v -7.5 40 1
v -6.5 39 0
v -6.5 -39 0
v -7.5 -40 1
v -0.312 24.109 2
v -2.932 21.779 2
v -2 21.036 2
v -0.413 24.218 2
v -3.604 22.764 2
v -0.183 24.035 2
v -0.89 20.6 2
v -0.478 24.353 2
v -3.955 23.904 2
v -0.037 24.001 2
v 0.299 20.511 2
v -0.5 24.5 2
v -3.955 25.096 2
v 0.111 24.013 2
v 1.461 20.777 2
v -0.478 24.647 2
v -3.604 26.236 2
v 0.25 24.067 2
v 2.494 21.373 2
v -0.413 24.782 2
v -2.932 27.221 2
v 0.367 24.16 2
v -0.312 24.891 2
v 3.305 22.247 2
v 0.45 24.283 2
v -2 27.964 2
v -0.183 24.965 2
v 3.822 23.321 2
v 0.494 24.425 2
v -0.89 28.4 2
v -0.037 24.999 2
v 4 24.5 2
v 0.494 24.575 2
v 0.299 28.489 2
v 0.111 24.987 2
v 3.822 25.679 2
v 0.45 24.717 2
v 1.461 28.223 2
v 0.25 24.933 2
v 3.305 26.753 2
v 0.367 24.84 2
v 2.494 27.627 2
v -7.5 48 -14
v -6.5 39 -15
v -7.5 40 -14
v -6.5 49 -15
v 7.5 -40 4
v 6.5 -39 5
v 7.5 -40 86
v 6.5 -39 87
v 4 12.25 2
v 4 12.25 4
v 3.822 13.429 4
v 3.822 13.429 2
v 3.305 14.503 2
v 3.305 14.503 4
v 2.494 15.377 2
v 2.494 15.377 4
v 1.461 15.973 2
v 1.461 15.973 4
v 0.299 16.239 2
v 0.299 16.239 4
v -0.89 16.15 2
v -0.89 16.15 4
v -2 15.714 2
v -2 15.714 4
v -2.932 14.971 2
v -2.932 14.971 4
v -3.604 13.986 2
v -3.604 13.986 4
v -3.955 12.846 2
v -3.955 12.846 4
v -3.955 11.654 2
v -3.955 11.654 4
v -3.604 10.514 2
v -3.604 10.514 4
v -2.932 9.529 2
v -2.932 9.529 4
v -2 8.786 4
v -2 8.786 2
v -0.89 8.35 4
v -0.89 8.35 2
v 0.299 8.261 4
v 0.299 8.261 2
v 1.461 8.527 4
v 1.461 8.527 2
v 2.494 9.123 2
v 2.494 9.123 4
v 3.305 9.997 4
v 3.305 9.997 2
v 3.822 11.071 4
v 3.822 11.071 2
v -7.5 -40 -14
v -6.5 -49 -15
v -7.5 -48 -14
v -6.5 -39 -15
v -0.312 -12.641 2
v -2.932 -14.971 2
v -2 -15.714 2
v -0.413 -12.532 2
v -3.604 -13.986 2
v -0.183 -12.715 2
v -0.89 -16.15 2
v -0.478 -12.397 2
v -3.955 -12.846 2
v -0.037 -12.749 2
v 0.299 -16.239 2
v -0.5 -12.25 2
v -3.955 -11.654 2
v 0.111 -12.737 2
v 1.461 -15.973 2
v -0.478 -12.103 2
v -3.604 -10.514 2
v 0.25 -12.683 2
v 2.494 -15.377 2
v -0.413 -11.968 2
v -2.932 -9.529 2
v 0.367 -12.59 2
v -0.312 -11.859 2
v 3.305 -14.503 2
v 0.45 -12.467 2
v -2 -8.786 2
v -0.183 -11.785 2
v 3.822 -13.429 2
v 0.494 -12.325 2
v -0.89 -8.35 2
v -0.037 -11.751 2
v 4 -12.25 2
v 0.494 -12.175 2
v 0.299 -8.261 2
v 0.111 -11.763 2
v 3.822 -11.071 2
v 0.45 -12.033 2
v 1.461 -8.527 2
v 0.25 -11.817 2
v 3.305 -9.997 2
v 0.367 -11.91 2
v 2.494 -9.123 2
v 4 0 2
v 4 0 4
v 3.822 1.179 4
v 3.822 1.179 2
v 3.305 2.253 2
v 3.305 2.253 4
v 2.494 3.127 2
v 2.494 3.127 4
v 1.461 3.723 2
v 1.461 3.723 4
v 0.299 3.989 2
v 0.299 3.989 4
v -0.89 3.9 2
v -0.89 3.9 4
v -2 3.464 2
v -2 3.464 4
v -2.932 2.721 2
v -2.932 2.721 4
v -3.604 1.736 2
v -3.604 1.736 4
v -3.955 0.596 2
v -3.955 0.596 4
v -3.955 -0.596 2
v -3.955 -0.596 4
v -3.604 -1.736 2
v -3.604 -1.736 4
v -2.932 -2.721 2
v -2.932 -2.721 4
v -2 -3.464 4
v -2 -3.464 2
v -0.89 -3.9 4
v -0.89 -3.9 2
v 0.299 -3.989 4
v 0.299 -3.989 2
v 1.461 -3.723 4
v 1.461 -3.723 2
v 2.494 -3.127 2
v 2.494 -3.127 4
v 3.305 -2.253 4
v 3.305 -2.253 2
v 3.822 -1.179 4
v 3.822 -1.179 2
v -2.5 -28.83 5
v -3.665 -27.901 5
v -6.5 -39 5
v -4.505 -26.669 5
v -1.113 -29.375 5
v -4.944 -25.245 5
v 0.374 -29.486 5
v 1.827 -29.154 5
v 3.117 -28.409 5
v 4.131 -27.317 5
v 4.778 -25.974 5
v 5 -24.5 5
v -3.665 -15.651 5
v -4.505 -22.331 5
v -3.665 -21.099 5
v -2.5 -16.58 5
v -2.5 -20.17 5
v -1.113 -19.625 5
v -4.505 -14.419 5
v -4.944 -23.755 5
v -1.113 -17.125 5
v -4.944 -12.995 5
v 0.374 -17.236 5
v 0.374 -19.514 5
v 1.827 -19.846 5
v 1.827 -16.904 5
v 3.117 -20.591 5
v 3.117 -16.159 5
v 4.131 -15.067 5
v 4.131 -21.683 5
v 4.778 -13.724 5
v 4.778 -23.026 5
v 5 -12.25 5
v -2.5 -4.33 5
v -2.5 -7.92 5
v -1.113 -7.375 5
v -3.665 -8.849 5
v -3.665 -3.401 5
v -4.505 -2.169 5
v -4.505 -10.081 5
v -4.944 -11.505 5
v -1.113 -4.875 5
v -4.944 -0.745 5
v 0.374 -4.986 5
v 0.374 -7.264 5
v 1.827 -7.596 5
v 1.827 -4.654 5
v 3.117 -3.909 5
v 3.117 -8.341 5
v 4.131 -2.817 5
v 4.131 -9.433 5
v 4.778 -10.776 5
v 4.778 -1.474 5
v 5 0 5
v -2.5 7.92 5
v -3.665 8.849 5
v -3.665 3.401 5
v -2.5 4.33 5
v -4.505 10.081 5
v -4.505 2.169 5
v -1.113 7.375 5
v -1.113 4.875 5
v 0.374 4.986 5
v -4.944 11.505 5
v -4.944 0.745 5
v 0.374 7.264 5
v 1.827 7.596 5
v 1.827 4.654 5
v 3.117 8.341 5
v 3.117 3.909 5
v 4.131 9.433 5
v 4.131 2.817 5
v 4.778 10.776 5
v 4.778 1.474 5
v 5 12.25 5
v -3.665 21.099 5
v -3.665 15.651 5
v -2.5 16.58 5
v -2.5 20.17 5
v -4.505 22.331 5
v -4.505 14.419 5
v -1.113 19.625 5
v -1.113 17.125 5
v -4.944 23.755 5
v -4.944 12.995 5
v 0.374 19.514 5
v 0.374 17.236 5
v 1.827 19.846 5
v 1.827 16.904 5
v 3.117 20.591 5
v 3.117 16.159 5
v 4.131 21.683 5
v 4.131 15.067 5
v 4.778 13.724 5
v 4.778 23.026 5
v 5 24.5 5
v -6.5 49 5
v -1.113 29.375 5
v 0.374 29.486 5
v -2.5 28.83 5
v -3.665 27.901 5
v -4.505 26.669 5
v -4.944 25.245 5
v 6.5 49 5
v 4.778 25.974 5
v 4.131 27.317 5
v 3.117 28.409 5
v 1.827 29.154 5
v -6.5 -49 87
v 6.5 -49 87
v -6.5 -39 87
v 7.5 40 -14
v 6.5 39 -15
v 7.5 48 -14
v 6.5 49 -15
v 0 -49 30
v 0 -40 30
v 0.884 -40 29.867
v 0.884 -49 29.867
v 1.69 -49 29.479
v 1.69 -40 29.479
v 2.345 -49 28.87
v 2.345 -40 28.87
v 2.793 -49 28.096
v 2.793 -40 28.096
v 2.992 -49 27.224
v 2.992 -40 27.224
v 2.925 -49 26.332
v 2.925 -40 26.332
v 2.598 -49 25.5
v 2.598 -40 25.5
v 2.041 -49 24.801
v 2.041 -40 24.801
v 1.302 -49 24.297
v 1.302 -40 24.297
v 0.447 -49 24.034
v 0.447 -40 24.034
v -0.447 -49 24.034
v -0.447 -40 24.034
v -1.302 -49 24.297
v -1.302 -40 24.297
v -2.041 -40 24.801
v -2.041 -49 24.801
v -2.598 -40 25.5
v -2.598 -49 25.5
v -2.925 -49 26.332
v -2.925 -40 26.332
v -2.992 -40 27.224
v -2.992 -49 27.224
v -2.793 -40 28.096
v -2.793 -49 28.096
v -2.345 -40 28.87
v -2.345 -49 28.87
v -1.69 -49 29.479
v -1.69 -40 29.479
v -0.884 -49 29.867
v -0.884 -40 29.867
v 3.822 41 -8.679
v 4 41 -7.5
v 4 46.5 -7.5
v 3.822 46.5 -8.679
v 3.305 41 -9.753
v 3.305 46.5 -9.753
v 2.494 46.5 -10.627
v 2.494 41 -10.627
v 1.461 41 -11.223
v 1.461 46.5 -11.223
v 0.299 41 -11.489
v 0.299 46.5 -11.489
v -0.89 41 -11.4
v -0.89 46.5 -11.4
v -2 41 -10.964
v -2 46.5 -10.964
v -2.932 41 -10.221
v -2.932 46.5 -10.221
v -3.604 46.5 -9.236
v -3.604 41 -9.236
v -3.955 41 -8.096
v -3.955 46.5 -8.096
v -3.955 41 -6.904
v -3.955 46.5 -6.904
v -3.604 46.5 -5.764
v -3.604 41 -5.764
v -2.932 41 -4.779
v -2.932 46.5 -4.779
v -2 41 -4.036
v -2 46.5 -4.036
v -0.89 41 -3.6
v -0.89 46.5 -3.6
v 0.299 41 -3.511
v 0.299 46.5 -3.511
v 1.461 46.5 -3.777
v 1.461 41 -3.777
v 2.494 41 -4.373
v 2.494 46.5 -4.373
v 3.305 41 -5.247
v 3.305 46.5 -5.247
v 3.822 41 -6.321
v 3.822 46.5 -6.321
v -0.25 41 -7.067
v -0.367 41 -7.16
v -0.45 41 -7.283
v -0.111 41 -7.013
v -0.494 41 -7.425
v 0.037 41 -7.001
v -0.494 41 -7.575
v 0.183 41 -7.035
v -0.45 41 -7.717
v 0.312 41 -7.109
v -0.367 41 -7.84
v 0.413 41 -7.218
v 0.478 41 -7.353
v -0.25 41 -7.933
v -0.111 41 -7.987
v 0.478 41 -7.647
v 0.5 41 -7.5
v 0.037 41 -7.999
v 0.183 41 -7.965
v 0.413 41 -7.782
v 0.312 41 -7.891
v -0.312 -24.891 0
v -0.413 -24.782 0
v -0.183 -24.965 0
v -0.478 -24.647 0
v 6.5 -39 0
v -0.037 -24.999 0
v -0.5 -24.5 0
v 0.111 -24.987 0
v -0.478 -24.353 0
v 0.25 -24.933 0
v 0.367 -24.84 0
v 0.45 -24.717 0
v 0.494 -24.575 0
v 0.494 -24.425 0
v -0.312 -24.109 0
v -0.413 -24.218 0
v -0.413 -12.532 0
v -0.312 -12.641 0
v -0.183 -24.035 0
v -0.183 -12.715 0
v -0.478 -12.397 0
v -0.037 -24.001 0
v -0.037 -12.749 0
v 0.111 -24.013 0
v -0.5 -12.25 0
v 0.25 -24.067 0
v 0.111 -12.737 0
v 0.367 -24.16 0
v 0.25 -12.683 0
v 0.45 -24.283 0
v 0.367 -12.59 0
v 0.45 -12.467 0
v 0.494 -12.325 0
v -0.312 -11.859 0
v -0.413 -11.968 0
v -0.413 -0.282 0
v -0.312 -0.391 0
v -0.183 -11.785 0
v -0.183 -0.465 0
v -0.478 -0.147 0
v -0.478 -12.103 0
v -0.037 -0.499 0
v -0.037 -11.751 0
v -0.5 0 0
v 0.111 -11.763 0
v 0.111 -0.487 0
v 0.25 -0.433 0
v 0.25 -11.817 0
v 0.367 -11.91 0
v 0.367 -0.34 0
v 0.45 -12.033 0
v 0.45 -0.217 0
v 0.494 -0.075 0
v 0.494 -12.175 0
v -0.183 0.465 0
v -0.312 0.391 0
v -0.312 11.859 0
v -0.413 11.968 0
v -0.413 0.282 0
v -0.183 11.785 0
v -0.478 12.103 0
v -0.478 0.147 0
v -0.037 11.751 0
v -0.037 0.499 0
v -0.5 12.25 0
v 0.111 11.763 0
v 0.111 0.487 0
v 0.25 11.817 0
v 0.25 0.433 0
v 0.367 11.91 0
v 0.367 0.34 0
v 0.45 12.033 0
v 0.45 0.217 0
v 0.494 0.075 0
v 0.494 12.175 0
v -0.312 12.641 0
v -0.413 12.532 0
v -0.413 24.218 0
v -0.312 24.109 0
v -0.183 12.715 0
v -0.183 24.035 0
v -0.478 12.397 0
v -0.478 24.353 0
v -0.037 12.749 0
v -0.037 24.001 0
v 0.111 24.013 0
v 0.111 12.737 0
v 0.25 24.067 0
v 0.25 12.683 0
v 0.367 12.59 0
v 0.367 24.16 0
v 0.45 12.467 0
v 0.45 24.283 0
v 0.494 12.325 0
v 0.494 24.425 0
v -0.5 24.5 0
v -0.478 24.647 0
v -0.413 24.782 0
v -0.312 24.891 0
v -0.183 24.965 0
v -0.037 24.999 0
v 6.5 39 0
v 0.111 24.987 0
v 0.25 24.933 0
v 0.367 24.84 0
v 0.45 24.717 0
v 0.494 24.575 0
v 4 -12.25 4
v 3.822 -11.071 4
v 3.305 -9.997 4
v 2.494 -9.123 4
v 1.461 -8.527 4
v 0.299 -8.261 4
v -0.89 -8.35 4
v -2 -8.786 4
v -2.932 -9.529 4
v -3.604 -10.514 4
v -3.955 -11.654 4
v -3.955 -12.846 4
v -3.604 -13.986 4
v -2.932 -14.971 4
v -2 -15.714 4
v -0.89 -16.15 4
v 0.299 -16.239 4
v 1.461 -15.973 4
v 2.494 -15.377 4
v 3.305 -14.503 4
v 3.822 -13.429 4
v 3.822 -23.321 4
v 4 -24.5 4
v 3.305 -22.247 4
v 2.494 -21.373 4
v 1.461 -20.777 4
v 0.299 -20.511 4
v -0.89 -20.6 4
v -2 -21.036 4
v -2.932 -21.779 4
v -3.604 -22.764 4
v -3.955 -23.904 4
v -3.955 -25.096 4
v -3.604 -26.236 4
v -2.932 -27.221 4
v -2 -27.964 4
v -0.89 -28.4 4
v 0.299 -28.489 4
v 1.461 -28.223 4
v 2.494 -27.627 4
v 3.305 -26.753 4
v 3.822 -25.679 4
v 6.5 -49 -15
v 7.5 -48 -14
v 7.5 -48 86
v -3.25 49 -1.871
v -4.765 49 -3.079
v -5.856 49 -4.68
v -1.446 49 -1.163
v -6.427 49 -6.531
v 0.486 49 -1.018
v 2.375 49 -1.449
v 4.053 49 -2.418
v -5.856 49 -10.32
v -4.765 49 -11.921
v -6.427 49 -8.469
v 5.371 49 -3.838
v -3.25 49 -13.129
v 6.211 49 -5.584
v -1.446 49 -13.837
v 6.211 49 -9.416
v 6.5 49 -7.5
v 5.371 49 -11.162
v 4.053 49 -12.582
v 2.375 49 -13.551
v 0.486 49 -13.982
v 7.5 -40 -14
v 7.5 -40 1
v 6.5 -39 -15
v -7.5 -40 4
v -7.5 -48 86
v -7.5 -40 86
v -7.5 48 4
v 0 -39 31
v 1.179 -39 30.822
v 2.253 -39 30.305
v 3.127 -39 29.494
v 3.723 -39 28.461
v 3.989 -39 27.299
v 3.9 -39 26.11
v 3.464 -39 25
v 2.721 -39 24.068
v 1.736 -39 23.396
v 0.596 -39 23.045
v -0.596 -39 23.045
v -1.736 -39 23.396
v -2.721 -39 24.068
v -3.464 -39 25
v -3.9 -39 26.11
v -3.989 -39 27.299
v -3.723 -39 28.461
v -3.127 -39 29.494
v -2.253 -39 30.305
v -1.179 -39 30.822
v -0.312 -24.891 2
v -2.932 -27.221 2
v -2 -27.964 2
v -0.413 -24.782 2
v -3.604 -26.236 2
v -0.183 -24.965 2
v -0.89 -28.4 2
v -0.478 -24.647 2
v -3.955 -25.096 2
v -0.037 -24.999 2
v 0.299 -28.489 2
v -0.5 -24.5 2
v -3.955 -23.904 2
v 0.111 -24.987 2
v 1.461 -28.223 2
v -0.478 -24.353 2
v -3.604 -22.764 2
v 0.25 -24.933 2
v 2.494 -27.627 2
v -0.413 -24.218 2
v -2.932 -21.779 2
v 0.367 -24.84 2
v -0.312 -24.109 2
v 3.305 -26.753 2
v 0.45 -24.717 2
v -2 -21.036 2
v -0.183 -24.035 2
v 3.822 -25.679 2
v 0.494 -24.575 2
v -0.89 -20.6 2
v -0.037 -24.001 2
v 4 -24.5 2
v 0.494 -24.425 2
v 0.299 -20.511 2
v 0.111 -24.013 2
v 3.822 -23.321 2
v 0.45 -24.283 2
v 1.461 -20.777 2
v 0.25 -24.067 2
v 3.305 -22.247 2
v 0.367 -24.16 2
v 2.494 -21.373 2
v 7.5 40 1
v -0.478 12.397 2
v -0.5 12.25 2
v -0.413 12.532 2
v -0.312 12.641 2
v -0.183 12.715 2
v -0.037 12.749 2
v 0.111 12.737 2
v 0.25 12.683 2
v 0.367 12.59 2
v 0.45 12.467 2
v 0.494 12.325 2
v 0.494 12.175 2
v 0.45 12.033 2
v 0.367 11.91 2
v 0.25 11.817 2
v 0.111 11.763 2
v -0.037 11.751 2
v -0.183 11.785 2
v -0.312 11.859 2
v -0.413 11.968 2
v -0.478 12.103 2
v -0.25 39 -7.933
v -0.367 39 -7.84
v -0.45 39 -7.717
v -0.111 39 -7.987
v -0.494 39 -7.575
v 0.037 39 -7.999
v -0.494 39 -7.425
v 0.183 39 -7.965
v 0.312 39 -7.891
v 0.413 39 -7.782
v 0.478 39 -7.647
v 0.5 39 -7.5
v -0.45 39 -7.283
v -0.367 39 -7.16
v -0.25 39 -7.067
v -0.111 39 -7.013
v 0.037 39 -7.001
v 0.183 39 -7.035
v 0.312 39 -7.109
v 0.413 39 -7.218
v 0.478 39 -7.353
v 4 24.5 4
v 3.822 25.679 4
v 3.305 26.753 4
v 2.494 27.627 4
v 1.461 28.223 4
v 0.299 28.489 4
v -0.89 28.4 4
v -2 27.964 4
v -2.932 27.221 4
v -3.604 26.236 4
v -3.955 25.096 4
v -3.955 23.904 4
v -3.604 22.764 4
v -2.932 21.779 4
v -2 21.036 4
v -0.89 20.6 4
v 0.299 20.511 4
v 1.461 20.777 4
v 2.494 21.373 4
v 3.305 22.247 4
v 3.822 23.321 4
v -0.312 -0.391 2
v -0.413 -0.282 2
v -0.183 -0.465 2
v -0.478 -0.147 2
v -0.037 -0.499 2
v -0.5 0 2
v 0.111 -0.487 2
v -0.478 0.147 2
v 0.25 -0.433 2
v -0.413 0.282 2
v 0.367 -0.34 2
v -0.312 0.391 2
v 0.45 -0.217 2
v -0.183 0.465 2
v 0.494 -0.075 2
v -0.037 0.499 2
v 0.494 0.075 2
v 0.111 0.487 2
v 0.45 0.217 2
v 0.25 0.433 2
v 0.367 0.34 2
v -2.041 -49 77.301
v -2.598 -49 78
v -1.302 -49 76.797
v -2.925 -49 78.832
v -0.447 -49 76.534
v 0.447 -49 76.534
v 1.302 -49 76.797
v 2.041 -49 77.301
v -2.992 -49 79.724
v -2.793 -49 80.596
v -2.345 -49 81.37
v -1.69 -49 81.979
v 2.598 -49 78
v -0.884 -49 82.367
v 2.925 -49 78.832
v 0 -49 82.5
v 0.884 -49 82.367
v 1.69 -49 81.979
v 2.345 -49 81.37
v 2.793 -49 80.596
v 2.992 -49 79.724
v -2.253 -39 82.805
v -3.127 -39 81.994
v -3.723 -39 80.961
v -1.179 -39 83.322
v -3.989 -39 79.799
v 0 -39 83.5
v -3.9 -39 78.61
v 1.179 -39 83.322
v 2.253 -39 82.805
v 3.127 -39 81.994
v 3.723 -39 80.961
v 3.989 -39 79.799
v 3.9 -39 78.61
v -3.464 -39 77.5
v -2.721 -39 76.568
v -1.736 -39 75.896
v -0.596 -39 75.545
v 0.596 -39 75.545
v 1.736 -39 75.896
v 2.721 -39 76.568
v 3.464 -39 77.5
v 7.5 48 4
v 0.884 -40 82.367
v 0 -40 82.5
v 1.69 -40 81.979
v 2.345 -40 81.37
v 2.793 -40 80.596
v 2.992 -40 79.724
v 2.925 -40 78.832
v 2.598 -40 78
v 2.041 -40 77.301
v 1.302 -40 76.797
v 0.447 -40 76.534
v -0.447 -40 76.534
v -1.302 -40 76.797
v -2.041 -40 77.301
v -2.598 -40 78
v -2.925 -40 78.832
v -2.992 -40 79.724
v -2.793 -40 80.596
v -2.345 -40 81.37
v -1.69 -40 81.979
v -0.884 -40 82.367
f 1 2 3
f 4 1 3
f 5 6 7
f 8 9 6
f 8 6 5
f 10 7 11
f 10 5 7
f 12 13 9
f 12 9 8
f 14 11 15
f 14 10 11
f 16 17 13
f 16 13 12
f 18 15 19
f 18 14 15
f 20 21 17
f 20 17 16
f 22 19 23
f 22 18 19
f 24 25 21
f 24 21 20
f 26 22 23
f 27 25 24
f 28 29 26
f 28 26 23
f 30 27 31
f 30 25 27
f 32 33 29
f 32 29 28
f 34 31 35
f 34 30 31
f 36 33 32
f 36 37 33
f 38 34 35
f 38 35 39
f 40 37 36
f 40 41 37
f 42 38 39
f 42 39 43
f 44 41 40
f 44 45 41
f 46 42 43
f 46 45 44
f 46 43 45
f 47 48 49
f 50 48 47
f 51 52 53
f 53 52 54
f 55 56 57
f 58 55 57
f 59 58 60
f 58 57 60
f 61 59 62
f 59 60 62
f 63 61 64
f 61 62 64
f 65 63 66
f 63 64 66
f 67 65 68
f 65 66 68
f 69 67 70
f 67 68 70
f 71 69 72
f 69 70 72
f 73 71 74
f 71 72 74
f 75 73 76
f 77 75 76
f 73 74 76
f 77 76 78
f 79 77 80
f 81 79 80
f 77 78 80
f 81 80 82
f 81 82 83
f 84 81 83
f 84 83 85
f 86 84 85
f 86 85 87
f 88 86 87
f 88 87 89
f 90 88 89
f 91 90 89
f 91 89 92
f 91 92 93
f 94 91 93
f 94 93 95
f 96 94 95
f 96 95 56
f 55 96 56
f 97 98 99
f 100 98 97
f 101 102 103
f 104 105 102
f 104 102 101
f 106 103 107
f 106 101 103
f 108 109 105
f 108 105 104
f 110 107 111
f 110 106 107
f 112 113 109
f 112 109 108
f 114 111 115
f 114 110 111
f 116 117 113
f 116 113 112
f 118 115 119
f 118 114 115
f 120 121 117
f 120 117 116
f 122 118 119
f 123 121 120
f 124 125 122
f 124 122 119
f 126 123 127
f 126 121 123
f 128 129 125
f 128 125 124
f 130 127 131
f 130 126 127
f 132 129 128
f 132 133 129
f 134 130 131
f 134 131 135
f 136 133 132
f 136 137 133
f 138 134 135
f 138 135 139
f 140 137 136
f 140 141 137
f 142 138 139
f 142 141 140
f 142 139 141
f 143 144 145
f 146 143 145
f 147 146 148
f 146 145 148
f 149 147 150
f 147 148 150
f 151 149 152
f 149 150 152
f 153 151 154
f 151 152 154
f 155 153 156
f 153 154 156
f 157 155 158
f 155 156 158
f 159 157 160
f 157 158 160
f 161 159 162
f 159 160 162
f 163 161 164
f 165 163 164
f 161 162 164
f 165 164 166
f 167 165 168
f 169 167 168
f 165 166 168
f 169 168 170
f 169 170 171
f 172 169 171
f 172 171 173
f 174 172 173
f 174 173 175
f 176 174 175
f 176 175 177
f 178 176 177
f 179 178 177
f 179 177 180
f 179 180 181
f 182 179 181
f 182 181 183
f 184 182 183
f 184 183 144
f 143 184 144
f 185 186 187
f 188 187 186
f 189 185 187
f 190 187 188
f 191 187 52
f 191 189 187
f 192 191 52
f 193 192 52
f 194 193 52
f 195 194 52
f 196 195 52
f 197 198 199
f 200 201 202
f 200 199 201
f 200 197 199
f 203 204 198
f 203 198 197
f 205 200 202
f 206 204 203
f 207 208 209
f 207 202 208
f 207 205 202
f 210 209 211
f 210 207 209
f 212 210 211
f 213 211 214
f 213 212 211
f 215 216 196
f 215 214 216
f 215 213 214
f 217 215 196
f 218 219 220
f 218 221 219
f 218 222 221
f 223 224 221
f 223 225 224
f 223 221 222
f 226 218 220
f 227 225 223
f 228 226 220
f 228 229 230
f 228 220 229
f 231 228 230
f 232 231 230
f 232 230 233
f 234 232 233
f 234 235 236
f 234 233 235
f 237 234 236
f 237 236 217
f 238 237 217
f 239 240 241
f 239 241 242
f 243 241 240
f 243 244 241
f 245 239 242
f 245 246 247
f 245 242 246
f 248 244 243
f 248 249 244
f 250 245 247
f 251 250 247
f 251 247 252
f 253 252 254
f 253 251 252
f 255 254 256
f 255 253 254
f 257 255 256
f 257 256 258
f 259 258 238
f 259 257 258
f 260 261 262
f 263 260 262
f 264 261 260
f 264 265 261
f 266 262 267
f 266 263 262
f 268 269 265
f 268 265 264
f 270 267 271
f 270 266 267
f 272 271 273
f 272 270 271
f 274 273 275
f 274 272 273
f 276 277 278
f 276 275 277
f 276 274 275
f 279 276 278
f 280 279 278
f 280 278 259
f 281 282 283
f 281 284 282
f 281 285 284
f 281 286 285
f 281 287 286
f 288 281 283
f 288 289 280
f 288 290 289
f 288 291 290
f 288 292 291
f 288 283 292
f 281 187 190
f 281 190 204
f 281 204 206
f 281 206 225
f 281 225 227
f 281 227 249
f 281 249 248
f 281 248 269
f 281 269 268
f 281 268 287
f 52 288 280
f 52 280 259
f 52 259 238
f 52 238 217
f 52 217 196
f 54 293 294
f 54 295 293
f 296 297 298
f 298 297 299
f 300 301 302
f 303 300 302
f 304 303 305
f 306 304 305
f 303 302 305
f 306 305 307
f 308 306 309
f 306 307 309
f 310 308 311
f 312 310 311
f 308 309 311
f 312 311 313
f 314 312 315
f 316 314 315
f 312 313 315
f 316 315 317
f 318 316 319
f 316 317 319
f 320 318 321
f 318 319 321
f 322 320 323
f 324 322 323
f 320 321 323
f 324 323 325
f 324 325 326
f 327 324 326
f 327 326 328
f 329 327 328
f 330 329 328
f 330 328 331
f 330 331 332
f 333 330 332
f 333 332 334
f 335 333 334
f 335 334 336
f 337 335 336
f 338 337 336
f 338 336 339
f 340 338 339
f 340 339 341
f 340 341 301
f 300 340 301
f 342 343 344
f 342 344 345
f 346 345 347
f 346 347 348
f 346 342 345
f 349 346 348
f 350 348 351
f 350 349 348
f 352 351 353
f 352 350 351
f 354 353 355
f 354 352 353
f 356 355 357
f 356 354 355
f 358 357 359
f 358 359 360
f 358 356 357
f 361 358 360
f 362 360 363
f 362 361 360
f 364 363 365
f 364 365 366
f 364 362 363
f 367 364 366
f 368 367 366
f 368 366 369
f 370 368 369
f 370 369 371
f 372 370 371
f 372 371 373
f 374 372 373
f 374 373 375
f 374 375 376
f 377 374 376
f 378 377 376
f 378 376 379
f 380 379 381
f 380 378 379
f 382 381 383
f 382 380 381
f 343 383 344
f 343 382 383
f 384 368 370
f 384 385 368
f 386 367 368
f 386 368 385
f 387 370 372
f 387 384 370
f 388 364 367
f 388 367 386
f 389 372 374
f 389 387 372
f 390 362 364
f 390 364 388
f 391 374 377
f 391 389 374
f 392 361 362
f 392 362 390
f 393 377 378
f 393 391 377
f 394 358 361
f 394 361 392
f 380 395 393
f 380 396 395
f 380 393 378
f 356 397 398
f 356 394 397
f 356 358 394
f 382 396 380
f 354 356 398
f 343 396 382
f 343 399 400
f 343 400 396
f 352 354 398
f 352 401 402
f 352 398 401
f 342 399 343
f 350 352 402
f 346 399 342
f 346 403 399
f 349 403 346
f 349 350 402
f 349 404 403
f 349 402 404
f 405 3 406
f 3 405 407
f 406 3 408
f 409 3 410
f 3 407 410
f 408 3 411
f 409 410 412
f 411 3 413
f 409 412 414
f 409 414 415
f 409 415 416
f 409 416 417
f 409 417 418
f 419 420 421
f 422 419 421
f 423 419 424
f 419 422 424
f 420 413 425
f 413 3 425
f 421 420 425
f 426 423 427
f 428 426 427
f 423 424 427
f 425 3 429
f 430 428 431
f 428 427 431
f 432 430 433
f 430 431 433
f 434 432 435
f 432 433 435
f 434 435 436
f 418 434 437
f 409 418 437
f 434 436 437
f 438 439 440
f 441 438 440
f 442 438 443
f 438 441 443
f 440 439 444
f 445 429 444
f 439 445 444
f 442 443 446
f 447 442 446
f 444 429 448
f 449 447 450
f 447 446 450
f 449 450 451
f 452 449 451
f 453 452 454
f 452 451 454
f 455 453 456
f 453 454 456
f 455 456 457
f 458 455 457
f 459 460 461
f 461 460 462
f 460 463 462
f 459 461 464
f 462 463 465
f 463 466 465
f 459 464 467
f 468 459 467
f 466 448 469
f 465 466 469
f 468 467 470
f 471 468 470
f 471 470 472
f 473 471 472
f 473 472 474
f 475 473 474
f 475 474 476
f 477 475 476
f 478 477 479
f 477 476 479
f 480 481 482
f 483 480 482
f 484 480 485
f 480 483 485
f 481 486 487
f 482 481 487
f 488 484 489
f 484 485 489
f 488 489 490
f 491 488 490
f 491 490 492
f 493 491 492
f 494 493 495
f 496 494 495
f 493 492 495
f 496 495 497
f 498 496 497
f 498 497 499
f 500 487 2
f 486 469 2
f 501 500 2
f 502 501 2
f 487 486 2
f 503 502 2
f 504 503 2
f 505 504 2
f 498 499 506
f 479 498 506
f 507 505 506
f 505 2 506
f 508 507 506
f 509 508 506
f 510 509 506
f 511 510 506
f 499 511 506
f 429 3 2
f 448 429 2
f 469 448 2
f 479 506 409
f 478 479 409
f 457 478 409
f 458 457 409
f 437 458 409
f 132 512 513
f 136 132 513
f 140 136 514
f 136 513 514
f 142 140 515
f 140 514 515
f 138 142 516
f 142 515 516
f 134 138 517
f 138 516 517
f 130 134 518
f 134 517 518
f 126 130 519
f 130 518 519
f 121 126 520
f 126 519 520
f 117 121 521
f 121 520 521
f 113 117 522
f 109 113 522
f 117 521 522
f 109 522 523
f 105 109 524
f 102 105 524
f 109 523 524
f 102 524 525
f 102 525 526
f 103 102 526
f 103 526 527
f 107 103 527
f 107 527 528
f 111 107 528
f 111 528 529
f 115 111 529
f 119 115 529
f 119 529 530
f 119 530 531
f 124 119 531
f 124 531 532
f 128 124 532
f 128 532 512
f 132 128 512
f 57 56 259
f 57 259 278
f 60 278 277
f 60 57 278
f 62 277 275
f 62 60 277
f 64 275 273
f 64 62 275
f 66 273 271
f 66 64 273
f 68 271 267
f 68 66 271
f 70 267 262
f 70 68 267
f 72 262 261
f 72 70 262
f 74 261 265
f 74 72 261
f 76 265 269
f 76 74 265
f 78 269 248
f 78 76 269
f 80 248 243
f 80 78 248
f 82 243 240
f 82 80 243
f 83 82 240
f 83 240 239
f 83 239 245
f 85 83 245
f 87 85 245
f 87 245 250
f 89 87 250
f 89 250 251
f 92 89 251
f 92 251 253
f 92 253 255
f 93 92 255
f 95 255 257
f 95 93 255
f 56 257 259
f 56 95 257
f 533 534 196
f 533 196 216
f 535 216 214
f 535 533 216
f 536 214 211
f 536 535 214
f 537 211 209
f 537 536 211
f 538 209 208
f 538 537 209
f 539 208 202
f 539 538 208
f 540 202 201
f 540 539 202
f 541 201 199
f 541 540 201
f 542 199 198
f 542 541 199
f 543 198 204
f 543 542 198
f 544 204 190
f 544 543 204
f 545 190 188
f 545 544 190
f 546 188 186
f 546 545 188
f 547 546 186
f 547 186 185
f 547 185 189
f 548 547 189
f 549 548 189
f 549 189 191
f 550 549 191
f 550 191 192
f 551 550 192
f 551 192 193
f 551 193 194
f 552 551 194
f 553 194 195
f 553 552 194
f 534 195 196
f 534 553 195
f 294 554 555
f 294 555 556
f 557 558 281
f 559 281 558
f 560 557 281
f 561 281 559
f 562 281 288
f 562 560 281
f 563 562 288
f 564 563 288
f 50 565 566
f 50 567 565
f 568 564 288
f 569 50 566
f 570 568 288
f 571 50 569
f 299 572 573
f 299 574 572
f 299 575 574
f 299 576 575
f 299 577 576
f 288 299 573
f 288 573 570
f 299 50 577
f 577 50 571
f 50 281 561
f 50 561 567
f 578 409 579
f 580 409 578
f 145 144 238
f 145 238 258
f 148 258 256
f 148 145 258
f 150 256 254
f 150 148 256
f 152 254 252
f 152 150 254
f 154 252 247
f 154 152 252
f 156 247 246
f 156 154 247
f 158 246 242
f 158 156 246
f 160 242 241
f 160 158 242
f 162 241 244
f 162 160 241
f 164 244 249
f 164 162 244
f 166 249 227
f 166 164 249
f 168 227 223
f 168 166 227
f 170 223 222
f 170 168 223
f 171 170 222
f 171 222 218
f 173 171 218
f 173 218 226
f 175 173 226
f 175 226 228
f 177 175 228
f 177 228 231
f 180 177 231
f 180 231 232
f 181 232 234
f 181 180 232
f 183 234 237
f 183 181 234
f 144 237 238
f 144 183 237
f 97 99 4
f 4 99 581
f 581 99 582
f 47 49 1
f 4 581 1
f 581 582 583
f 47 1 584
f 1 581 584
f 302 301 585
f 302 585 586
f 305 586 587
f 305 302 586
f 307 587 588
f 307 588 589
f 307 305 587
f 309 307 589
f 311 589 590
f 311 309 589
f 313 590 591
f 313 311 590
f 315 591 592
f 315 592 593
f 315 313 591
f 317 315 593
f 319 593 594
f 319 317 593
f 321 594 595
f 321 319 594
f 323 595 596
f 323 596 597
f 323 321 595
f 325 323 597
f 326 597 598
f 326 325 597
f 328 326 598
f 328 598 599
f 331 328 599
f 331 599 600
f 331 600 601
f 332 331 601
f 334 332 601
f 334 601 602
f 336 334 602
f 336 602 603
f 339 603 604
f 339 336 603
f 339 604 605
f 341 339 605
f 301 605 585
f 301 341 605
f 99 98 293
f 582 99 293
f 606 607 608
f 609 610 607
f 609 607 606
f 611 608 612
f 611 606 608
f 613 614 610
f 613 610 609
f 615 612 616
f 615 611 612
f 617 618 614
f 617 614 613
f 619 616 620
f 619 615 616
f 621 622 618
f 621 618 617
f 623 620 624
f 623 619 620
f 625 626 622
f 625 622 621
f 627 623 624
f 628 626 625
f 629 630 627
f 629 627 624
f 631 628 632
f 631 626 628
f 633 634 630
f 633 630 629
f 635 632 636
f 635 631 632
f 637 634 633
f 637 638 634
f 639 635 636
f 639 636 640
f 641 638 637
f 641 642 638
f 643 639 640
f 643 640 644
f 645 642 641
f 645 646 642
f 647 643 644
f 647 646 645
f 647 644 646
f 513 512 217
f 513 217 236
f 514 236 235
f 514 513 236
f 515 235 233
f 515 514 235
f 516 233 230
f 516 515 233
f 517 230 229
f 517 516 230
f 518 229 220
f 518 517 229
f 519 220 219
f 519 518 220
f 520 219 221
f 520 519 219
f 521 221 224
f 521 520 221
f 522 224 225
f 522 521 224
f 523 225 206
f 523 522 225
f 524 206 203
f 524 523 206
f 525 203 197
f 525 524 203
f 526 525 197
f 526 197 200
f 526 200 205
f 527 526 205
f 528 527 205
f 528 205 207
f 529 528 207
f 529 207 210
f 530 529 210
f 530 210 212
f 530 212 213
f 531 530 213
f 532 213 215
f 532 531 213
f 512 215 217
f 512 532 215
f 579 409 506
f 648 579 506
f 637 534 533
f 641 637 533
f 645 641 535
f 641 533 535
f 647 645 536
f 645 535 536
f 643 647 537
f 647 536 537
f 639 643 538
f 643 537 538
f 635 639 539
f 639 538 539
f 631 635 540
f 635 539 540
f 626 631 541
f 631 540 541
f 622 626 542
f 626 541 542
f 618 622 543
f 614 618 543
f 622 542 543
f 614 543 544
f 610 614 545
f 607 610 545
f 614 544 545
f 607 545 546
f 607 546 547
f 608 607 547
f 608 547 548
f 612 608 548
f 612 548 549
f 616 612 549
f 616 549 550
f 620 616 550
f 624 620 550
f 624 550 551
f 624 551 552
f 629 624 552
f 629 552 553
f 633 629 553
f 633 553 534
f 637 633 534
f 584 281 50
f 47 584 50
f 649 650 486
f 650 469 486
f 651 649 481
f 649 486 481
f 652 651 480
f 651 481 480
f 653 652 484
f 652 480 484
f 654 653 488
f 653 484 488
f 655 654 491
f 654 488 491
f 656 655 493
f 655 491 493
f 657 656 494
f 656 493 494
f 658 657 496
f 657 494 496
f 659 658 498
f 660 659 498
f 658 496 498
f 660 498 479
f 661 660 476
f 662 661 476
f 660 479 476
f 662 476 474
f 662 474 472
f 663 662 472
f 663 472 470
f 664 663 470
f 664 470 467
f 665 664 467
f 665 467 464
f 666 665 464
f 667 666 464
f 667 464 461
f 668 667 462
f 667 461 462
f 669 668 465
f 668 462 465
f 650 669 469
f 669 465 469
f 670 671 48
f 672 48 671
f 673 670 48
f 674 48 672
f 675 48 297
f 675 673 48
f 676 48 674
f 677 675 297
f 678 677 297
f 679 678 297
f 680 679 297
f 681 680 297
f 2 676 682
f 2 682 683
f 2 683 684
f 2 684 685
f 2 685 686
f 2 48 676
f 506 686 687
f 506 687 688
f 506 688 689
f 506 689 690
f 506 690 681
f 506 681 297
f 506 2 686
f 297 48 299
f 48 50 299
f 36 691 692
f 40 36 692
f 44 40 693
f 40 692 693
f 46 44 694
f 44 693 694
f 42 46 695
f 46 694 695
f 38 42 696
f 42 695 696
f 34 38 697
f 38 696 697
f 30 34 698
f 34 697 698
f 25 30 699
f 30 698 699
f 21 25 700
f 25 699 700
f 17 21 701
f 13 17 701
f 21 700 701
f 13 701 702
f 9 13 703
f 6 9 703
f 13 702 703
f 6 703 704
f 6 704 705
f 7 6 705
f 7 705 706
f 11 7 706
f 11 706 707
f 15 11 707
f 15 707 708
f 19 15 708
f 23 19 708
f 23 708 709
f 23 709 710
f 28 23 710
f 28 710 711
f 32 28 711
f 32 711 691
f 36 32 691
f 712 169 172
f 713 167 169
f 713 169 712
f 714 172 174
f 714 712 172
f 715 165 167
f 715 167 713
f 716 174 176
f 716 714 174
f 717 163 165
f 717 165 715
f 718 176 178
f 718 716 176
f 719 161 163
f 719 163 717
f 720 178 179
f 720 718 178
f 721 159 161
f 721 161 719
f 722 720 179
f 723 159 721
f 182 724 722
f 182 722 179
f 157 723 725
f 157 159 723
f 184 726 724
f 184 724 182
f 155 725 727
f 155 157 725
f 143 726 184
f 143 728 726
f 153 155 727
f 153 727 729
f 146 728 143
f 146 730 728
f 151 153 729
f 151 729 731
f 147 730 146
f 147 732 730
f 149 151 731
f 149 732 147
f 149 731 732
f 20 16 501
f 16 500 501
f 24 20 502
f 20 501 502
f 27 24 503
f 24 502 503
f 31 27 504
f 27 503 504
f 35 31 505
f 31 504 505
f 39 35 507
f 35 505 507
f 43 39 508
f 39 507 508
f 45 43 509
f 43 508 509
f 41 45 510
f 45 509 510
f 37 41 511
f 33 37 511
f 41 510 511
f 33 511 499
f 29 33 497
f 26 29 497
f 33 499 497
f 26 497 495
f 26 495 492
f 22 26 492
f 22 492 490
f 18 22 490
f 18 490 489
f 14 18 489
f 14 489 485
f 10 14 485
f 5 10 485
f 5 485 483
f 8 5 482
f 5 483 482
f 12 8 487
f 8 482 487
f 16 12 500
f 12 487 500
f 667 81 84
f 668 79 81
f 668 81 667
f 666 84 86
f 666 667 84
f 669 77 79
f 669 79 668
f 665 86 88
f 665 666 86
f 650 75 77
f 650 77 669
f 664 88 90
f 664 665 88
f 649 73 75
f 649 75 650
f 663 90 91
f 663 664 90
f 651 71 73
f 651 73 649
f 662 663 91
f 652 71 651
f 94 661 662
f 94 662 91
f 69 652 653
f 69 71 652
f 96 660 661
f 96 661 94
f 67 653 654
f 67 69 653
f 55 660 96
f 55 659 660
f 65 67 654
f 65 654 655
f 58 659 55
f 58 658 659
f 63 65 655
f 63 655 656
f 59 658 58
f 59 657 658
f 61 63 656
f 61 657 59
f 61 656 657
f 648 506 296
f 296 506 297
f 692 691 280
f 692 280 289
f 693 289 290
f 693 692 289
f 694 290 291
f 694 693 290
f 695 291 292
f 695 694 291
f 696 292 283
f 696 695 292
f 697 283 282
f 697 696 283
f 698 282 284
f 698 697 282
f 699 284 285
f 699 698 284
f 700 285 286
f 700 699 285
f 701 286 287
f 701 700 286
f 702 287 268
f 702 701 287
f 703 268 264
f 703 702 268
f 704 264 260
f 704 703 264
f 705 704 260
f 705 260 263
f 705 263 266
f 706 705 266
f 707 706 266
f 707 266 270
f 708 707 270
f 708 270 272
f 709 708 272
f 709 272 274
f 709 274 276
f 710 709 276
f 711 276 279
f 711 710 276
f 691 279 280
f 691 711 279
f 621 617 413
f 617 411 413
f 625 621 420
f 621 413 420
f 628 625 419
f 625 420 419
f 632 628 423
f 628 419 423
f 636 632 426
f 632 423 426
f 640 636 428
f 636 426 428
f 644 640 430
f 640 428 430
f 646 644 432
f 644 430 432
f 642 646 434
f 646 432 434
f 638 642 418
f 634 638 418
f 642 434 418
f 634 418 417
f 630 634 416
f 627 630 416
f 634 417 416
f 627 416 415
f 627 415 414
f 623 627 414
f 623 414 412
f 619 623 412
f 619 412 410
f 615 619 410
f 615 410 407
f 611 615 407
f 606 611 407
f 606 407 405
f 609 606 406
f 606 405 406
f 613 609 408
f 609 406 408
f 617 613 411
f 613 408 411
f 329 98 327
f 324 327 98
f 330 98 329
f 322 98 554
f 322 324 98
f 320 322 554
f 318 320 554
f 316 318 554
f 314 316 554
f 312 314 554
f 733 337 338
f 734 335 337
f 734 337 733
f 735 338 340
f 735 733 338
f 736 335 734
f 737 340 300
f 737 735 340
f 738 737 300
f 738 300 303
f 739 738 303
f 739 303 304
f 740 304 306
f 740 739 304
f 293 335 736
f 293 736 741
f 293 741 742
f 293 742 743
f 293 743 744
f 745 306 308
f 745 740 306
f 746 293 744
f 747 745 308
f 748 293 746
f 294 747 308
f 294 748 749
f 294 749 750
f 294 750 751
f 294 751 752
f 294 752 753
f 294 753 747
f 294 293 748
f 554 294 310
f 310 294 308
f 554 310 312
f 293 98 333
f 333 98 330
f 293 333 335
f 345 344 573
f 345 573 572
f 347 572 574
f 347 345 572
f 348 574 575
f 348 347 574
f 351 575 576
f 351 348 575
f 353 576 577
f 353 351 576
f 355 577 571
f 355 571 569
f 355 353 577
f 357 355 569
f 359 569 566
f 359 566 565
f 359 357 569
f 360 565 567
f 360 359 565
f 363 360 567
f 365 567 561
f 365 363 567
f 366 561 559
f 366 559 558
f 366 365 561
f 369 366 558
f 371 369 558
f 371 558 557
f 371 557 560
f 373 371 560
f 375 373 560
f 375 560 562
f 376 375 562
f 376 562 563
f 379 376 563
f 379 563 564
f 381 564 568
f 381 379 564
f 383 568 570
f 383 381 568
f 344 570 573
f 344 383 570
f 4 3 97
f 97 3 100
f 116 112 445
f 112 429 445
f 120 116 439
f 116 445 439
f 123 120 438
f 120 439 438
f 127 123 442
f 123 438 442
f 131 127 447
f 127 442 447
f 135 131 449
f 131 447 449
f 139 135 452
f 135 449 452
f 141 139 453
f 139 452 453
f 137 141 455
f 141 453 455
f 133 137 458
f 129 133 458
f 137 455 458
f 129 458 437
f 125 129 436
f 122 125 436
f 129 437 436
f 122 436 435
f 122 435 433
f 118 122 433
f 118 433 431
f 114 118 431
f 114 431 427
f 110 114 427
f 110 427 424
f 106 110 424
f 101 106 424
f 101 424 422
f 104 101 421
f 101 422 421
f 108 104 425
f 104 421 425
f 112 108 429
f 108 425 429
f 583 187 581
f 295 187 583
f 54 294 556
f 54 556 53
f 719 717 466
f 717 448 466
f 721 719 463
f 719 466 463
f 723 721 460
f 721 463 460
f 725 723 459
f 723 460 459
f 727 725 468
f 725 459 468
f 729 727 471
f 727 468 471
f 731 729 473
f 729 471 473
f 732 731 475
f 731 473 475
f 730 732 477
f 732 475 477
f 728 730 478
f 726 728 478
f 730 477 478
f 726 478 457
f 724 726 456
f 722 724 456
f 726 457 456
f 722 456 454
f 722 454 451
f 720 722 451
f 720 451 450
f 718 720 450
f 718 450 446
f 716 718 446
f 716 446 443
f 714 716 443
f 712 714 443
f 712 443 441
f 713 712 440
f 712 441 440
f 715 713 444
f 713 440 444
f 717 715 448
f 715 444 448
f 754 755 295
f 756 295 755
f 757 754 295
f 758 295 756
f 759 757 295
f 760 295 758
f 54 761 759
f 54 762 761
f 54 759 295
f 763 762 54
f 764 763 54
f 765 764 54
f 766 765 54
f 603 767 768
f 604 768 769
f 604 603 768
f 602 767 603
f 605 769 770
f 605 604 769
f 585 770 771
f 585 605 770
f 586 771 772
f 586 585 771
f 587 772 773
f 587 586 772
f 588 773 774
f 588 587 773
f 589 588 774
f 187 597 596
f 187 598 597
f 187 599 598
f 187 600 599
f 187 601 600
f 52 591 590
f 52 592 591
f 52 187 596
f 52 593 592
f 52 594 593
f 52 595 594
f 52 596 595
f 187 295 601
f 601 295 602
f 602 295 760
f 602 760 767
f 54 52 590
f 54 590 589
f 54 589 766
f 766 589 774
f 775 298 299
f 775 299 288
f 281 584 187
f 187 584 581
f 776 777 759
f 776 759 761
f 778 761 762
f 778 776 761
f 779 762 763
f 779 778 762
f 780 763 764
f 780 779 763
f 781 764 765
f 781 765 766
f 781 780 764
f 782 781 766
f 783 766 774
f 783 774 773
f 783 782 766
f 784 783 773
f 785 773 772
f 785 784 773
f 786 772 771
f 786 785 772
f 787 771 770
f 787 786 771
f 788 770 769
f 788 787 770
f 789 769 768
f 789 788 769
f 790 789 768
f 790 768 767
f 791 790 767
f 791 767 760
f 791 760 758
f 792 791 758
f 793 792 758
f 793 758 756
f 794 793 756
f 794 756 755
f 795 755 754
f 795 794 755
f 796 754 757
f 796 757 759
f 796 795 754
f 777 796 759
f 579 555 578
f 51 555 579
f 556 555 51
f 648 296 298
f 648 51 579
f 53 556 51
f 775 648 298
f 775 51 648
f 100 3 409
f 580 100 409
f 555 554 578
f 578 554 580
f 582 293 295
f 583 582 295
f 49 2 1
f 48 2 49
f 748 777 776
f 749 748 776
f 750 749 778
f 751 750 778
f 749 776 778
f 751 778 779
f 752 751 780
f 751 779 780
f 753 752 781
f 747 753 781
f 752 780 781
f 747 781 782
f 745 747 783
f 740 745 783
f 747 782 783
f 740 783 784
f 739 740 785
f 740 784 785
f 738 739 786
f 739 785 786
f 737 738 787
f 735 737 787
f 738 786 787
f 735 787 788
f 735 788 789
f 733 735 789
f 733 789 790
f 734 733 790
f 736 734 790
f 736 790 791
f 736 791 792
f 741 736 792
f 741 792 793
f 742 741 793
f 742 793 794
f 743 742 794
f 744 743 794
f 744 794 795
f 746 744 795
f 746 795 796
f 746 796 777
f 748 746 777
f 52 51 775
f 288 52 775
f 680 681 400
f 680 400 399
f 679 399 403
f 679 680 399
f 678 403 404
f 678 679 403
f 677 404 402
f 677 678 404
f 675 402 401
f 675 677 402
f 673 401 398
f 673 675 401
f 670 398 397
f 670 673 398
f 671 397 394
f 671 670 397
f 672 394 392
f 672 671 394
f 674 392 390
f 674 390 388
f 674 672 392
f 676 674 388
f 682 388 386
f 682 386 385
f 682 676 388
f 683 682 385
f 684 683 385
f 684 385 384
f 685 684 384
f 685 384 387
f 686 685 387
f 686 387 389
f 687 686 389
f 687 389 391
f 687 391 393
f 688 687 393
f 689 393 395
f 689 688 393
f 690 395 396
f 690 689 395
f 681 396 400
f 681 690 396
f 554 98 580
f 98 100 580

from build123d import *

# Parameters (mm, degrees)
SKETCH1_W           = 15
SKETCH1_H           = 10
SKETCH1_H_2         = 78
BOSS_EXTRUDE1_DEPTH = 5
SKETCH1_3_W         = 15
SKETCH1_3_H         = 10
BOSS_EXTRUDE2_DEPTH = 15
HOLE1_D             = 1
HOLE1_CBORE_D       = 8
HOLE1_CBORE_DEPTH   = 3
SKETCH1_4_W         = 15
SKETCH1_4_H         = 10
BOSS_EXTRUDE3_DEPTH = 87
HOLE2_START         = 41
HOLE2_OUTLINE_R     = 4
HOLE2_DEPTH         = 8
HOLE2_START_2       = 39
HOLE2_2_OUTLINE_R   = 0.5
HOLE2_2_DEPTH       = 2
CUT_EXTRUDE1_REACH  = 125.973
SKETCH9_R           = 3
CHAMFER1_SIZE       = 2.5
CHAMFER2_SIZE       = 1
CHAMFER3_SIZE       = 1


# Read off the part's stored shape, not the designer's step: Hole2
with BuildPart() as part:
    # Sketch1 → Boss-Extrude1 (new body)
    with BuildSketch(Plane.XY):
        with Locations((0, -44)):
            Rectangle(SKETCH1_W, SKETCH1_H)
        Rectangle(SKETCH1_W, SKETCH1_H_2)
        with Locations((0, 44)):
            Rectangle(SKETCH1_W, SKETCH1_H)
    extrude(amount=BOSS_EXTRUDE1_DEPTH)

    # Sketch1<3> → Boss-Extrude2 (add)
    with BuildSketch(Plane.XY):
        with Locations((0, -44)):
            Rectangle(SKETCH1_3_W, SKETCH1_3_H)
        with Locations((0, 44)):
            Rectangle(SKETCH1_3_W, SKETCH1_3_H)
    extrude(amount=-BOSS_EXTRUDE2_DEPTH)

    # Hole1 (through all)
    with Locations(Plane.XY.offset(5)):
        with Locations((0, 24.5), (0, 12.25), (0, 0), (0, -12.25), (0, -24.5)):
            CounterBoreHole(HOLE1_D / 2, HOLE1_CBORE_D / 2, HOLE1_CBORE_DEPTH)

    # Sketch1<4> → Boss-Extrude3 (add)
    with BuildSketch(Plane.XY):
        with Locations((0, -44)):
            Rectangle(SKETCH1_4_W, SKETCH1_4_H)
    extrude(amount=BOSS_EXTRUDE3_DEPTH)

    # Hole2 outline → Hole2 (cut)
    with BuildSketch(Plane(origin=(0, 0, 0), x_dir=(1, 0, 0), z_dir=(0, 1, 0)).offset(HOLE2_START)):
        with Locations((0, 7.5)):
            Circle(HOLE2_OUTLINE_R)
    extrude(amount=HOLE2_DEPTH, mode=Mode.SUBTRACT)

    # Hole2 2 outline → Hole2 2 (cut)
    with BuildSketch(Plane(origin=(0, 0, 0), x_dir=(1, 0, 0), z_dir=(0, 1, 0)).offset(HOLE2_START_2)):
        with Locations((0, 7.5)):
            Circle(HOLE2_2_OUTLINE_R)
    extrude(amount=HOLE2_2_DEPTH, mode=Mode.SUBTRACT)

    # Sketch9 → Cut-Extrude1 (cut, up to next)
    with BuildSketch(Plane(origin=(0, -39, 0), x_dir=(1, 0, 0), z_dir=(0, 1, 0)), mode=Mode.PRIVATE) as cut_extrude1_sk1:
        with Locations(Location((0, -27, 0), (0, 0, 270))):
            Circle(SKETCH9_R)
    cut_extrude1_tool1 = extrude(cut_extrude1_sk1.sketch, amount=-CUT_EXTRUDE1_REACH, mode=Mode.PRIVATE) & part.part
    # Sketch9 → Cut-Extrude1 (cut, up to next)
    with BuildSketch(Plane(origin=(0, -39, 0), x_dir=(1, 0, 0), z_dir=(0, 1, 0)), mode=Mode.PRIVATE) as cut_extrude1_sk2:
        with Locations(Location((0, -79.5, 0), (0, 0, 270))):
            Circle(SKETCH9_R)
    cut_extrude1_tool2 = extrude(cut_extrude1_sk2.sketch, amount=-CUT_EXTRUDE1_REACH, mode=Mode.PRIVATE) & part.part
    add(cut_extrude1_tool1.solids().sort_by_distance((0, -39, 27))[0], mode=Mode.SUBTRACT)
    add(cut_extrude1_tool2.solids().sort_by_distance((0, -39, 79.5))[0], mode=Mode.SUBTRACT)

    # Chamfer1
    chamfer1_edges = [part.edges().sort_by_distance(p)[0] for p in [
        (-4, 49, -7.5),
    ]]
    chamfer(chamfer1_edges, length=CHAMFER1_SIZE)

    # Chamfer2
    chamfer2_edges = [part.edges().sort_by_distance(p)[0] for p in [
        (0, -39, 76.5),
        (0, -39, 24),
        (-4, -24.5, 5),
        (-4, -12.25, 5),
        (-4, 0, 5),
        (-4, 12.25, 5),
        (-4, 24.5, 5),
    ]]
    chamfer(chamfer2_edges, length=CHAMFER2_SIZE)

    # Chamfer3
    chamfer3_edges = [part.edges().sort_by_distance(p)[0] for p in [
        (7.5, -49, 36),
        (-7.5, -39, 46),
        (-7.5, -44, 87),
        (-7.5, -49, 36),
        (-7.5, 49, -5),
        (7.5, 49, -5),
        (-7.5, 5, 5),
        (7.5, -39, -7.5),
        (-7.5, -44, -15),
        (-7.5, -39, -7.5),
        (7.5, -44, -15),
        (-7.5, 0, 0),
        (7.5, 0, 0),
        (7.5, 39, -7.5),
        (-7.5, 39, -7.5),
        (7.5, 44, -15),
        (-7.5, 44, -15),
        (7.5, 5, 5),
        (7.5, -44, 87),
        (7.5, -39, 46),
    ]]
    chamfer(chamfer3_edges, length=CHAMFER3_SIZE - 0.0001)  # a hair under: the kernel refuses the full size


solid = part.part
